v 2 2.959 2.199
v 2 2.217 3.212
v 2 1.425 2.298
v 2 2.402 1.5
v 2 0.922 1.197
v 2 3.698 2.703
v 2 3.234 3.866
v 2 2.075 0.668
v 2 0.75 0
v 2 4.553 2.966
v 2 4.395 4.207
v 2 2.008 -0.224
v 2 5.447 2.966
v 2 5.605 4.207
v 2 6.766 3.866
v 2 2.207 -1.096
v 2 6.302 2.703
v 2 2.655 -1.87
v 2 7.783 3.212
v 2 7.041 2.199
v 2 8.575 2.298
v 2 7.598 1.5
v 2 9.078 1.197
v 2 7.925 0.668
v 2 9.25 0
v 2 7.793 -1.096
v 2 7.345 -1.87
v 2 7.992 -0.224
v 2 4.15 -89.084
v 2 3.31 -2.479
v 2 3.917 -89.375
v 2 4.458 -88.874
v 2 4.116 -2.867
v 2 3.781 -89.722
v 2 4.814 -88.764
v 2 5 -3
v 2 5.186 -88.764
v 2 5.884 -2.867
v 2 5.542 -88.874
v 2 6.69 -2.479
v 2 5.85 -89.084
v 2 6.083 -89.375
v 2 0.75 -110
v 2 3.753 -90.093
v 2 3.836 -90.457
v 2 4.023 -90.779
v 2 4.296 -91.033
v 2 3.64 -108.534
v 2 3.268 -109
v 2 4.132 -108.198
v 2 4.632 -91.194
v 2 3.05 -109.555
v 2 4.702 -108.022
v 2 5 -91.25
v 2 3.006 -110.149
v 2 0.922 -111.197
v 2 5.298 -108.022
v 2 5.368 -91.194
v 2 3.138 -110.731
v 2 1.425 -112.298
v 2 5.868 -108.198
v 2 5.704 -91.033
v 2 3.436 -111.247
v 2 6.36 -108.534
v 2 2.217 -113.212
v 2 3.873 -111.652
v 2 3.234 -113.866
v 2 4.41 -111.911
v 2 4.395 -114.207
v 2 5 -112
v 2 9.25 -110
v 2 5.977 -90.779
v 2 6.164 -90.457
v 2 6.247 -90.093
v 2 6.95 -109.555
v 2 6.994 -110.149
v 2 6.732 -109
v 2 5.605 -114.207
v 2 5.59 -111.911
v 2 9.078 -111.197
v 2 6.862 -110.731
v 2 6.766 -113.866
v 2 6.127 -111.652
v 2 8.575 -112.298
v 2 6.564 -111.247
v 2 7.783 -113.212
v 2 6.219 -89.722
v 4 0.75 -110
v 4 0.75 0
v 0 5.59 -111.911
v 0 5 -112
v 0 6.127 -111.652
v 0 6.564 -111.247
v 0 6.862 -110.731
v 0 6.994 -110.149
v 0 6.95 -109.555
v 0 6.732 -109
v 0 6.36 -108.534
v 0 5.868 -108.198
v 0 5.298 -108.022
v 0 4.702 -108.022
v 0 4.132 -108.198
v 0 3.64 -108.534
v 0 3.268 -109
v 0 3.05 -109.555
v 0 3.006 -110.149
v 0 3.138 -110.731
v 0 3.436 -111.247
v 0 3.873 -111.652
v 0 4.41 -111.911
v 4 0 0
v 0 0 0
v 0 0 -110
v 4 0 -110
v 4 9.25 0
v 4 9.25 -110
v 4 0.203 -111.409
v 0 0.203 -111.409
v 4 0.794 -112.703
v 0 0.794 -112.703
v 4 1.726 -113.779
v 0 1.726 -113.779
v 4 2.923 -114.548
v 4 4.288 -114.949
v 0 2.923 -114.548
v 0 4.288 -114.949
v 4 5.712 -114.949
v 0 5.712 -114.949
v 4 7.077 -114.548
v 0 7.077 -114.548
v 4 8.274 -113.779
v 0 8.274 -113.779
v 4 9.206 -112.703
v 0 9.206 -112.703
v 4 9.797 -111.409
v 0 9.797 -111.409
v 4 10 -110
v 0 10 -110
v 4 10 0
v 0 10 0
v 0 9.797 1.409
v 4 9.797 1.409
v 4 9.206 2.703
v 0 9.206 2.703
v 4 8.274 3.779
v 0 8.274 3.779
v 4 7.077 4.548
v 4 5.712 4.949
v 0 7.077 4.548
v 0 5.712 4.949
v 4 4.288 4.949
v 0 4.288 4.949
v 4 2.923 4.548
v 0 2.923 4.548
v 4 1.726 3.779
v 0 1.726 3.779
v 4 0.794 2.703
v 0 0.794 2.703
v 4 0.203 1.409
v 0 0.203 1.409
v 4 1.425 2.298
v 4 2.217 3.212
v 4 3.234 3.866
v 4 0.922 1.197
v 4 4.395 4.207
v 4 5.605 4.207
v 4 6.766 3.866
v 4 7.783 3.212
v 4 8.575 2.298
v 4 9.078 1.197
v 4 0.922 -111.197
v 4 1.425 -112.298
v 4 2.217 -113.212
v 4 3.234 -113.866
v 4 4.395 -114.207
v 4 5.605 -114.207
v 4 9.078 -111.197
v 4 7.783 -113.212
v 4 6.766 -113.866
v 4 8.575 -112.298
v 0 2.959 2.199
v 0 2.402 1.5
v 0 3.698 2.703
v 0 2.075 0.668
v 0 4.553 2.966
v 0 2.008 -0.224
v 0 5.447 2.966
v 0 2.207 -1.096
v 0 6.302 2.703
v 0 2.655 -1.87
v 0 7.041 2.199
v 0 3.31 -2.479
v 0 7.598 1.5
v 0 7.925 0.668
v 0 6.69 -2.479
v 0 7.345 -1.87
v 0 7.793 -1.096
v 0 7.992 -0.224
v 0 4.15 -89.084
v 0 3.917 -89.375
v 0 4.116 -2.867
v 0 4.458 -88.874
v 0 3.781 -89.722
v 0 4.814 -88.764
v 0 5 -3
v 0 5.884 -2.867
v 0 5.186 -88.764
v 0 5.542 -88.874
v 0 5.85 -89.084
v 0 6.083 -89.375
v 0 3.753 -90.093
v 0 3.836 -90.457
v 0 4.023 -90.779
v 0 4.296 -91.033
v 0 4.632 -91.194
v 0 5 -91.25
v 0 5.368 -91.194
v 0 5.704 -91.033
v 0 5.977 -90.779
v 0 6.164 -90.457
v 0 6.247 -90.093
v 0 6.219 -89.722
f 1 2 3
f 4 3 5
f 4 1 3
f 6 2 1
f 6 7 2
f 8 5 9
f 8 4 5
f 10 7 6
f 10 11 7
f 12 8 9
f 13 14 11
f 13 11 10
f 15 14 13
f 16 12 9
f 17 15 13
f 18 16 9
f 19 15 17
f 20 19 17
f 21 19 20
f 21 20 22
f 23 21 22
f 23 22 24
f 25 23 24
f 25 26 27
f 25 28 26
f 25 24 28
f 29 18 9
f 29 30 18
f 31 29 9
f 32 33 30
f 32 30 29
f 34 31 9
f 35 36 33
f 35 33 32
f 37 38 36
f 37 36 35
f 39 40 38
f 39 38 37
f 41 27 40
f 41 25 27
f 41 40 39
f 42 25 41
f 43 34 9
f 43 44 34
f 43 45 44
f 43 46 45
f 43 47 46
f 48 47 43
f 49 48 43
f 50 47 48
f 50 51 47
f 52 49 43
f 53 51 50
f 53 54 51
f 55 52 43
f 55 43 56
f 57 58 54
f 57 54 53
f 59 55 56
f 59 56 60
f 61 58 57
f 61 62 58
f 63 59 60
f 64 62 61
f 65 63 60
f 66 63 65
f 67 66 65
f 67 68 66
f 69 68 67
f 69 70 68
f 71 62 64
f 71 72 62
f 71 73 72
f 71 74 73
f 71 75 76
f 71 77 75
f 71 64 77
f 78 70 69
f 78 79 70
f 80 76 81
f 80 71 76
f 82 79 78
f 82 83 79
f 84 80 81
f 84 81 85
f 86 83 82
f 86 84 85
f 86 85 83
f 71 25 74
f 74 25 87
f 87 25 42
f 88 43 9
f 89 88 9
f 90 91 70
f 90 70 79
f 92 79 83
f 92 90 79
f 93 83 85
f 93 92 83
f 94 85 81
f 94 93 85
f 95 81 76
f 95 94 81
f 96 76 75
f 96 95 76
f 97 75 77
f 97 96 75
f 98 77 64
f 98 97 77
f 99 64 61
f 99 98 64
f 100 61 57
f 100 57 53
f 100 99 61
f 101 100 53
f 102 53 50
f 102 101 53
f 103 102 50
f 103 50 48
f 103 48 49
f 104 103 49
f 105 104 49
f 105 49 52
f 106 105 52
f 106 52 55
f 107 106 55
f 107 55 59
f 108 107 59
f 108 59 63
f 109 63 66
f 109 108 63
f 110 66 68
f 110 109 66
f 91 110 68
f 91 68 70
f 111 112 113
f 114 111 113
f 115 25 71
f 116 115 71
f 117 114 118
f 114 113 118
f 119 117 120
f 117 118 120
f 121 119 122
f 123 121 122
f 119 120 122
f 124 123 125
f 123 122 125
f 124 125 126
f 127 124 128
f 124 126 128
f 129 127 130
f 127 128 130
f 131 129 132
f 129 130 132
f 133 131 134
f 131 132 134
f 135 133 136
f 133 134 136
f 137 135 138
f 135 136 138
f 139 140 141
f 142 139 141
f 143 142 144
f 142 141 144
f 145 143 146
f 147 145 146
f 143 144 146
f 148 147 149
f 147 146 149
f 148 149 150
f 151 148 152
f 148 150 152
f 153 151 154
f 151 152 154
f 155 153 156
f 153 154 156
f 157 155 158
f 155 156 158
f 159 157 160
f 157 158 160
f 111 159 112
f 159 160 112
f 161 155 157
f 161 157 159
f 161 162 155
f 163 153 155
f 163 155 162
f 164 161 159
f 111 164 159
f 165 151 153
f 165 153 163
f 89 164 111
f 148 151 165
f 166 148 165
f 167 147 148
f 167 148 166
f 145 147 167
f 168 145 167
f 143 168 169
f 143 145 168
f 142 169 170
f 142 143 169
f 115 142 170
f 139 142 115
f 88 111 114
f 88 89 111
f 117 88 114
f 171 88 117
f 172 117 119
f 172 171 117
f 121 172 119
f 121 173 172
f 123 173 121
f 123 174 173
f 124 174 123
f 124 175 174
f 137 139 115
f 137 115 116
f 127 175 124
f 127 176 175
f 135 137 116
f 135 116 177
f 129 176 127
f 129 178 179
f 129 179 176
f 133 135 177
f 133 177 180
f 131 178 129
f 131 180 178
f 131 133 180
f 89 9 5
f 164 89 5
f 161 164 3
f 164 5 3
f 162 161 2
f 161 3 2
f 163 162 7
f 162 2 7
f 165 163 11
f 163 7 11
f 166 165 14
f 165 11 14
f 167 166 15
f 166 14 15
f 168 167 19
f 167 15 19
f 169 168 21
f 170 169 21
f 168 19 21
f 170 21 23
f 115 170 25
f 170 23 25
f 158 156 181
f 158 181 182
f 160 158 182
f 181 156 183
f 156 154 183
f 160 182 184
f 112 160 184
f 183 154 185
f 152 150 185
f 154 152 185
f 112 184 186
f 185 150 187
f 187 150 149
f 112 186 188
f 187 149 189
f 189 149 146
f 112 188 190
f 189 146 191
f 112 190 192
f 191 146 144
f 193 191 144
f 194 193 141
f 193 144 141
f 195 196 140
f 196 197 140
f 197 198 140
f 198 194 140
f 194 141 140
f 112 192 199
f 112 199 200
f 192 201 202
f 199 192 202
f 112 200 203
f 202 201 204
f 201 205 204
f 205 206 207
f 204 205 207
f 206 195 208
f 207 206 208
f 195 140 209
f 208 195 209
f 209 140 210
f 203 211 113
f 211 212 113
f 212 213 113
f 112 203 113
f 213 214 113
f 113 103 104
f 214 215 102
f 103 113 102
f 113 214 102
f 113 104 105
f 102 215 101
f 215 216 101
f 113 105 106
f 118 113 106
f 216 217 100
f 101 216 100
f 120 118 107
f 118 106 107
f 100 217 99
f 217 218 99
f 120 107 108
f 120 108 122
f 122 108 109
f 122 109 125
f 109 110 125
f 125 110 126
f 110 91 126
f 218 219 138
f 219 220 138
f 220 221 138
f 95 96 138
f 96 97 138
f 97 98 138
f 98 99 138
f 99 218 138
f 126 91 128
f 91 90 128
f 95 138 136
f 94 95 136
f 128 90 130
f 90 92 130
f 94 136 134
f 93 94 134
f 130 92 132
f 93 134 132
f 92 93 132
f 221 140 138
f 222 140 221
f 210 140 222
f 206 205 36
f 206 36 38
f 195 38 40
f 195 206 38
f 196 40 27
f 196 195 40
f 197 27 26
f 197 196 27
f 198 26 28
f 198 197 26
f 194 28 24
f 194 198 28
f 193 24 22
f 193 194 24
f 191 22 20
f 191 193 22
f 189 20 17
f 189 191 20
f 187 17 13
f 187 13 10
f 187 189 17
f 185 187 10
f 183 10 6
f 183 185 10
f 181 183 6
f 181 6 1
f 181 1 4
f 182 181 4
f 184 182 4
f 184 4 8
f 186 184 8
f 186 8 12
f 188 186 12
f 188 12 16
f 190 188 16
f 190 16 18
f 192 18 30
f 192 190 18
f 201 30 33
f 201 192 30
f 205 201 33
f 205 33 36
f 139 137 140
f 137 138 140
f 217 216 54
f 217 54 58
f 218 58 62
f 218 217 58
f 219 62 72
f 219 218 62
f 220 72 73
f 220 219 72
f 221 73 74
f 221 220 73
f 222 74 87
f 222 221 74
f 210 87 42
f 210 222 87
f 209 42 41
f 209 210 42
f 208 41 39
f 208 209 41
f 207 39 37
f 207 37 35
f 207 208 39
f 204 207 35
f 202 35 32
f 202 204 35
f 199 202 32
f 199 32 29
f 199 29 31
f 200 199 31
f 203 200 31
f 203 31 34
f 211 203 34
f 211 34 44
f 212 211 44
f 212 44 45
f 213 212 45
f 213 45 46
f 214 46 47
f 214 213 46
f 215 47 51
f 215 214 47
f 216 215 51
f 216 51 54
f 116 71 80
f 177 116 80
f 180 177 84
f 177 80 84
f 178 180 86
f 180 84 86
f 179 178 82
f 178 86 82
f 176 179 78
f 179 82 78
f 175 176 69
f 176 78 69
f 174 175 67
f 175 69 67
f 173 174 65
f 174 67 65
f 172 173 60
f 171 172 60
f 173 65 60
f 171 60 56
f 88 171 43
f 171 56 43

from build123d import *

# Parameters (mm, degrees)
SKETCH1_R           = 3
SKETCH1_R_2         = 2
SKETCH1_R_3         = 1.25
BOSS_EXTRUDE1_DEPTH = 2
BOSS_EXTRUDE3_DEPTH = 2


with BuildPart() as part:
    # Sketch1 → Boss-Extrude1 (new body)
    with BuildSketch(Plane(origin=(0, 0, 0), x_dir=(0, 0, -1), z_dir=(1, 0, 0))):
        with BuildLine():
            Line((0, 0), (110, 0))
            ThreePointArc((110, 0), (115, 5), (110, 10))
            Line((110, 10), (0, 10))
            ThreePointArc((0, 10), (-5, 5), (0, 0))
        make_face()
        with Locations((0, 5)):
            Circle(SKETCH1_R, mode=Mode.SUBTRACT)
        with Locations((110, 5)):
            Circle(SKETCH1_R_2, mode=Mode.SUBTRACT)
        with Locations((90, 5)):
            Circle(SKETCH1_R_3, mode=Mode.SUBTRACT)
    extrude(amount=BOSS_EXTRUDE1_DEPTH)

    # Sketch2 → Boss-Extrude3 (add)
    with BuildSketch(Plane(origin=(2, 0, 0), x_dir=(0, 0, -1), z_dir=(1, 0, 0))):
        with BuildLine():
            Line((0, 0), (110, 0))
            ThreePointArc((110, 0), (115, 5), (110, 10))
            Line((110, 10), (0, 10))
            ThreePointArc((0, 10), (-5, 5), (0, 0))
        make_face()
        with BuildLine():
            Line((0, 9.25), (110, 9.25))
            ThreePointArc((110, 9.25), (114.25, 5), (110, 0.75))
            Line((110, 0.75), (0, 0.75))
            ThreePointArc((0, 0.75), (-4.25, 5), (0, 9.25))
        make_face(mode=Mode.SUBTRACT)
    extrude(amount=BOSS_EXTRUDE3_DEPTH)


solid = part.part
